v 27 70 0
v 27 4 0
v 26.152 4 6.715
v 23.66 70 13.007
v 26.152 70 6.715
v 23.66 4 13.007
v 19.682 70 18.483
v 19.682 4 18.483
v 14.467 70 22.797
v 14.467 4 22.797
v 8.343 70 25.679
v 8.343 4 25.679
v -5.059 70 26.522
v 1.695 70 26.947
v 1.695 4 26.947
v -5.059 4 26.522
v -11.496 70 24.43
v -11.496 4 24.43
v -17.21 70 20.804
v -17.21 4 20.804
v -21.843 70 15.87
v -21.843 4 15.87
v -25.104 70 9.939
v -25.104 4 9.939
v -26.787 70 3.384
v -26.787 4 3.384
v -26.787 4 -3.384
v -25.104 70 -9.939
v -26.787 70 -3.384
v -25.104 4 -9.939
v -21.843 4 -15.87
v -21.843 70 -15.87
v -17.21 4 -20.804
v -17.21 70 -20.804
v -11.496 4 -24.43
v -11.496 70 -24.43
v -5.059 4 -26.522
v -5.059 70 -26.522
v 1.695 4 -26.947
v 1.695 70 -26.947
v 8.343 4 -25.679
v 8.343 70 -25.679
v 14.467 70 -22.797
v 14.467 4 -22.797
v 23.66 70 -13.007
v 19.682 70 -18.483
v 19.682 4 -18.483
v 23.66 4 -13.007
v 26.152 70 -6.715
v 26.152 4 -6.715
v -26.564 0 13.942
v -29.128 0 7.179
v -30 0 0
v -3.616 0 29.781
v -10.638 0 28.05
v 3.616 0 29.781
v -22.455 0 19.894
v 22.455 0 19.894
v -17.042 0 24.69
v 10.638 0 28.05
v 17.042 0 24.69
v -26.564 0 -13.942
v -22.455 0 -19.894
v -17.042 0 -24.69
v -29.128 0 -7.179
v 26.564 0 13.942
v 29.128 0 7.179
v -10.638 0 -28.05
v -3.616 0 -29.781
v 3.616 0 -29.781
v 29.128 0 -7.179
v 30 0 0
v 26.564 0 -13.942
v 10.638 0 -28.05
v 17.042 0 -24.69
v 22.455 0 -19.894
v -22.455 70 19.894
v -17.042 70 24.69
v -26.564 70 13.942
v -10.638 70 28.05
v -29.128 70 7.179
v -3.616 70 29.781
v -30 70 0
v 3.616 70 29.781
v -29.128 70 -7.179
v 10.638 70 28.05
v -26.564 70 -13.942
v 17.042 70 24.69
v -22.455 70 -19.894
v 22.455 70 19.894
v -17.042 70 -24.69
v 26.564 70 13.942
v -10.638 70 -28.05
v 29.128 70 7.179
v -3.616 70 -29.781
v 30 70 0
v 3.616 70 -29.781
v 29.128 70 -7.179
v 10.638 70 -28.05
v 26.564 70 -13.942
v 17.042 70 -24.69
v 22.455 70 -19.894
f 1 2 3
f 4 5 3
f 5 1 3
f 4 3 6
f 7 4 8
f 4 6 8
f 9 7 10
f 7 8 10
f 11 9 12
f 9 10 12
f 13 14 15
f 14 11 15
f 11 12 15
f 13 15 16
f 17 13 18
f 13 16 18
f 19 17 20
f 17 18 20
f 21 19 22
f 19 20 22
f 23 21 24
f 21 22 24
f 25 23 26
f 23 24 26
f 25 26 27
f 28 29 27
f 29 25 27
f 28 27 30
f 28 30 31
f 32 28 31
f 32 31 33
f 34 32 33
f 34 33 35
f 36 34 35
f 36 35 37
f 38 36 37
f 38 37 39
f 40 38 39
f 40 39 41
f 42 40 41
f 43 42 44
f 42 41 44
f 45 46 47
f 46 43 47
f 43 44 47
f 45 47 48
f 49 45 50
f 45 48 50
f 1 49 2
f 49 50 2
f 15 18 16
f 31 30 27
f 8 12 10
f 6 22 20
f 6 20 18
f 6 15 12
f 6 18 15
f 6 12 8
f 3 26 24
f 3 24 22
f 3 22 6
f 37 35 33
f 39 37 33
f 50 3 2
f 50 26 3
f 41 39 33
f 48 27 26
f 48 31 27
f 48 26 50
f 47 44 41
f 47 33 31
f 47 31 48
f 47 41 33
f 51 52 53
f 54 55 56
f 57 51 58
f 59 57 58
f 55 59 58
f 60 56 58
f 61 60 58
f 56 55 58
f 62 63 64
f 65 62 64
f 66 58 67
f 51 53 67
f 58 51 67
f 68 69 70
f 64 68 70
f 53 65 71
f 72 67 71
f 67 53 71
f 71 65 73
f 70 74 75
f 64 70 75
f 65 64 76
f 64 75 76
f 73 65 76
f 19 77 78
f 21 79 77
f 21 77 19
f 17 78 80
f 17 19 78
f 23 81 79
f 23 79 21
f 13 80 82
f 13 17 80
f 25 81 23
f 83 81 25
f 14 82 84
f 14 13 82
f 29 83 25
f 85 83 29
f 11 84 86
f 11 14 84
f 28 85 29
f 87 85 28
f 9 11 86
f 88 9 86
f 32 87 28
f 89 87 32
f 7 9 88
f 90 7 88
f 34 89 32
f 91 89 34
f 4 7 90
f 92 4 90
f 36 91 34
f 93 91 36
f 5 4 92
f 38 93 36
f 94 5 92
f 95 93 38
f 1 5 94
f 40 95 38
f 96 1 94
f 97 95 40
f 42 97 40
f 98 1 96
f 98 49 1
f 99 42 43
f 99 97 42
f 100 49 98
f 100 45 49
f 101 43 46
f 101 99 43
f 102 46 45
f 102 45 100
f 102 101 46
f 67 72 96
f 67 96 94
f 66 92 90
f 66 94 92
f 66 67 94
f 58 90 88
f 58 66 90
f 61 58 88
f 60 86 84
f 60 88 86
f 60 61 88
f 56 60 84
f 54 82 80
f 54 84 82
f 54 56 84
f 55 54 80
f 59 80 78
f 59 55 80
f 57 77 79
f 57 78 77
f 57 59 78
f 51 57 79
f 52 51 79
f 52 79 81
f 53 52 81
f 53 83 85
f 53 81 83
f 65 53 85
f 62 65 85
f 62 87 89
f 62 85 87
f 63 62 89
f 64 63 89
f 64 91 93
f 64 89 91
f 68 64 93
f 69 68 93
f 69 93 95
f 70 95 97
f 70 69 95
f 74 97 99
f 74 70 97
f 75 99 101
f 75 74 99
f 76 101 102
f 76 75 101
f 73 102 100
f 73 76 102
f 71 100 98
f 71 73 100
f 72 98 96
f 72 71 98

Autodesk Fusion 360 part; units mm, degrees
sketch "Sketch1" plane through (0, 0, 0) normal (0, 1, 0) x (1, 0, 0)
  circle A0 centre (0, 0) radius 30
  circle A1 centre (0, 0) radius 27
  dimension "d1" = 60
  dimension "d2" = 54
extrude "Extrude1" add sketch "Sketch1" along normal blind 70 makes body 1
extrude "Extrude2" add sketch "Sketch1" along normal blind 4 contours A1 bodies 1
copy_body "Body->Comp1" bodies 1 removing the originals makes body 2 in component "tubeToolHolder01"
component "tubeToolHolder01" placed x (1, 0, 0) y (0, 1, 0) z (0, 0, 1) at (0, 0, 0)
